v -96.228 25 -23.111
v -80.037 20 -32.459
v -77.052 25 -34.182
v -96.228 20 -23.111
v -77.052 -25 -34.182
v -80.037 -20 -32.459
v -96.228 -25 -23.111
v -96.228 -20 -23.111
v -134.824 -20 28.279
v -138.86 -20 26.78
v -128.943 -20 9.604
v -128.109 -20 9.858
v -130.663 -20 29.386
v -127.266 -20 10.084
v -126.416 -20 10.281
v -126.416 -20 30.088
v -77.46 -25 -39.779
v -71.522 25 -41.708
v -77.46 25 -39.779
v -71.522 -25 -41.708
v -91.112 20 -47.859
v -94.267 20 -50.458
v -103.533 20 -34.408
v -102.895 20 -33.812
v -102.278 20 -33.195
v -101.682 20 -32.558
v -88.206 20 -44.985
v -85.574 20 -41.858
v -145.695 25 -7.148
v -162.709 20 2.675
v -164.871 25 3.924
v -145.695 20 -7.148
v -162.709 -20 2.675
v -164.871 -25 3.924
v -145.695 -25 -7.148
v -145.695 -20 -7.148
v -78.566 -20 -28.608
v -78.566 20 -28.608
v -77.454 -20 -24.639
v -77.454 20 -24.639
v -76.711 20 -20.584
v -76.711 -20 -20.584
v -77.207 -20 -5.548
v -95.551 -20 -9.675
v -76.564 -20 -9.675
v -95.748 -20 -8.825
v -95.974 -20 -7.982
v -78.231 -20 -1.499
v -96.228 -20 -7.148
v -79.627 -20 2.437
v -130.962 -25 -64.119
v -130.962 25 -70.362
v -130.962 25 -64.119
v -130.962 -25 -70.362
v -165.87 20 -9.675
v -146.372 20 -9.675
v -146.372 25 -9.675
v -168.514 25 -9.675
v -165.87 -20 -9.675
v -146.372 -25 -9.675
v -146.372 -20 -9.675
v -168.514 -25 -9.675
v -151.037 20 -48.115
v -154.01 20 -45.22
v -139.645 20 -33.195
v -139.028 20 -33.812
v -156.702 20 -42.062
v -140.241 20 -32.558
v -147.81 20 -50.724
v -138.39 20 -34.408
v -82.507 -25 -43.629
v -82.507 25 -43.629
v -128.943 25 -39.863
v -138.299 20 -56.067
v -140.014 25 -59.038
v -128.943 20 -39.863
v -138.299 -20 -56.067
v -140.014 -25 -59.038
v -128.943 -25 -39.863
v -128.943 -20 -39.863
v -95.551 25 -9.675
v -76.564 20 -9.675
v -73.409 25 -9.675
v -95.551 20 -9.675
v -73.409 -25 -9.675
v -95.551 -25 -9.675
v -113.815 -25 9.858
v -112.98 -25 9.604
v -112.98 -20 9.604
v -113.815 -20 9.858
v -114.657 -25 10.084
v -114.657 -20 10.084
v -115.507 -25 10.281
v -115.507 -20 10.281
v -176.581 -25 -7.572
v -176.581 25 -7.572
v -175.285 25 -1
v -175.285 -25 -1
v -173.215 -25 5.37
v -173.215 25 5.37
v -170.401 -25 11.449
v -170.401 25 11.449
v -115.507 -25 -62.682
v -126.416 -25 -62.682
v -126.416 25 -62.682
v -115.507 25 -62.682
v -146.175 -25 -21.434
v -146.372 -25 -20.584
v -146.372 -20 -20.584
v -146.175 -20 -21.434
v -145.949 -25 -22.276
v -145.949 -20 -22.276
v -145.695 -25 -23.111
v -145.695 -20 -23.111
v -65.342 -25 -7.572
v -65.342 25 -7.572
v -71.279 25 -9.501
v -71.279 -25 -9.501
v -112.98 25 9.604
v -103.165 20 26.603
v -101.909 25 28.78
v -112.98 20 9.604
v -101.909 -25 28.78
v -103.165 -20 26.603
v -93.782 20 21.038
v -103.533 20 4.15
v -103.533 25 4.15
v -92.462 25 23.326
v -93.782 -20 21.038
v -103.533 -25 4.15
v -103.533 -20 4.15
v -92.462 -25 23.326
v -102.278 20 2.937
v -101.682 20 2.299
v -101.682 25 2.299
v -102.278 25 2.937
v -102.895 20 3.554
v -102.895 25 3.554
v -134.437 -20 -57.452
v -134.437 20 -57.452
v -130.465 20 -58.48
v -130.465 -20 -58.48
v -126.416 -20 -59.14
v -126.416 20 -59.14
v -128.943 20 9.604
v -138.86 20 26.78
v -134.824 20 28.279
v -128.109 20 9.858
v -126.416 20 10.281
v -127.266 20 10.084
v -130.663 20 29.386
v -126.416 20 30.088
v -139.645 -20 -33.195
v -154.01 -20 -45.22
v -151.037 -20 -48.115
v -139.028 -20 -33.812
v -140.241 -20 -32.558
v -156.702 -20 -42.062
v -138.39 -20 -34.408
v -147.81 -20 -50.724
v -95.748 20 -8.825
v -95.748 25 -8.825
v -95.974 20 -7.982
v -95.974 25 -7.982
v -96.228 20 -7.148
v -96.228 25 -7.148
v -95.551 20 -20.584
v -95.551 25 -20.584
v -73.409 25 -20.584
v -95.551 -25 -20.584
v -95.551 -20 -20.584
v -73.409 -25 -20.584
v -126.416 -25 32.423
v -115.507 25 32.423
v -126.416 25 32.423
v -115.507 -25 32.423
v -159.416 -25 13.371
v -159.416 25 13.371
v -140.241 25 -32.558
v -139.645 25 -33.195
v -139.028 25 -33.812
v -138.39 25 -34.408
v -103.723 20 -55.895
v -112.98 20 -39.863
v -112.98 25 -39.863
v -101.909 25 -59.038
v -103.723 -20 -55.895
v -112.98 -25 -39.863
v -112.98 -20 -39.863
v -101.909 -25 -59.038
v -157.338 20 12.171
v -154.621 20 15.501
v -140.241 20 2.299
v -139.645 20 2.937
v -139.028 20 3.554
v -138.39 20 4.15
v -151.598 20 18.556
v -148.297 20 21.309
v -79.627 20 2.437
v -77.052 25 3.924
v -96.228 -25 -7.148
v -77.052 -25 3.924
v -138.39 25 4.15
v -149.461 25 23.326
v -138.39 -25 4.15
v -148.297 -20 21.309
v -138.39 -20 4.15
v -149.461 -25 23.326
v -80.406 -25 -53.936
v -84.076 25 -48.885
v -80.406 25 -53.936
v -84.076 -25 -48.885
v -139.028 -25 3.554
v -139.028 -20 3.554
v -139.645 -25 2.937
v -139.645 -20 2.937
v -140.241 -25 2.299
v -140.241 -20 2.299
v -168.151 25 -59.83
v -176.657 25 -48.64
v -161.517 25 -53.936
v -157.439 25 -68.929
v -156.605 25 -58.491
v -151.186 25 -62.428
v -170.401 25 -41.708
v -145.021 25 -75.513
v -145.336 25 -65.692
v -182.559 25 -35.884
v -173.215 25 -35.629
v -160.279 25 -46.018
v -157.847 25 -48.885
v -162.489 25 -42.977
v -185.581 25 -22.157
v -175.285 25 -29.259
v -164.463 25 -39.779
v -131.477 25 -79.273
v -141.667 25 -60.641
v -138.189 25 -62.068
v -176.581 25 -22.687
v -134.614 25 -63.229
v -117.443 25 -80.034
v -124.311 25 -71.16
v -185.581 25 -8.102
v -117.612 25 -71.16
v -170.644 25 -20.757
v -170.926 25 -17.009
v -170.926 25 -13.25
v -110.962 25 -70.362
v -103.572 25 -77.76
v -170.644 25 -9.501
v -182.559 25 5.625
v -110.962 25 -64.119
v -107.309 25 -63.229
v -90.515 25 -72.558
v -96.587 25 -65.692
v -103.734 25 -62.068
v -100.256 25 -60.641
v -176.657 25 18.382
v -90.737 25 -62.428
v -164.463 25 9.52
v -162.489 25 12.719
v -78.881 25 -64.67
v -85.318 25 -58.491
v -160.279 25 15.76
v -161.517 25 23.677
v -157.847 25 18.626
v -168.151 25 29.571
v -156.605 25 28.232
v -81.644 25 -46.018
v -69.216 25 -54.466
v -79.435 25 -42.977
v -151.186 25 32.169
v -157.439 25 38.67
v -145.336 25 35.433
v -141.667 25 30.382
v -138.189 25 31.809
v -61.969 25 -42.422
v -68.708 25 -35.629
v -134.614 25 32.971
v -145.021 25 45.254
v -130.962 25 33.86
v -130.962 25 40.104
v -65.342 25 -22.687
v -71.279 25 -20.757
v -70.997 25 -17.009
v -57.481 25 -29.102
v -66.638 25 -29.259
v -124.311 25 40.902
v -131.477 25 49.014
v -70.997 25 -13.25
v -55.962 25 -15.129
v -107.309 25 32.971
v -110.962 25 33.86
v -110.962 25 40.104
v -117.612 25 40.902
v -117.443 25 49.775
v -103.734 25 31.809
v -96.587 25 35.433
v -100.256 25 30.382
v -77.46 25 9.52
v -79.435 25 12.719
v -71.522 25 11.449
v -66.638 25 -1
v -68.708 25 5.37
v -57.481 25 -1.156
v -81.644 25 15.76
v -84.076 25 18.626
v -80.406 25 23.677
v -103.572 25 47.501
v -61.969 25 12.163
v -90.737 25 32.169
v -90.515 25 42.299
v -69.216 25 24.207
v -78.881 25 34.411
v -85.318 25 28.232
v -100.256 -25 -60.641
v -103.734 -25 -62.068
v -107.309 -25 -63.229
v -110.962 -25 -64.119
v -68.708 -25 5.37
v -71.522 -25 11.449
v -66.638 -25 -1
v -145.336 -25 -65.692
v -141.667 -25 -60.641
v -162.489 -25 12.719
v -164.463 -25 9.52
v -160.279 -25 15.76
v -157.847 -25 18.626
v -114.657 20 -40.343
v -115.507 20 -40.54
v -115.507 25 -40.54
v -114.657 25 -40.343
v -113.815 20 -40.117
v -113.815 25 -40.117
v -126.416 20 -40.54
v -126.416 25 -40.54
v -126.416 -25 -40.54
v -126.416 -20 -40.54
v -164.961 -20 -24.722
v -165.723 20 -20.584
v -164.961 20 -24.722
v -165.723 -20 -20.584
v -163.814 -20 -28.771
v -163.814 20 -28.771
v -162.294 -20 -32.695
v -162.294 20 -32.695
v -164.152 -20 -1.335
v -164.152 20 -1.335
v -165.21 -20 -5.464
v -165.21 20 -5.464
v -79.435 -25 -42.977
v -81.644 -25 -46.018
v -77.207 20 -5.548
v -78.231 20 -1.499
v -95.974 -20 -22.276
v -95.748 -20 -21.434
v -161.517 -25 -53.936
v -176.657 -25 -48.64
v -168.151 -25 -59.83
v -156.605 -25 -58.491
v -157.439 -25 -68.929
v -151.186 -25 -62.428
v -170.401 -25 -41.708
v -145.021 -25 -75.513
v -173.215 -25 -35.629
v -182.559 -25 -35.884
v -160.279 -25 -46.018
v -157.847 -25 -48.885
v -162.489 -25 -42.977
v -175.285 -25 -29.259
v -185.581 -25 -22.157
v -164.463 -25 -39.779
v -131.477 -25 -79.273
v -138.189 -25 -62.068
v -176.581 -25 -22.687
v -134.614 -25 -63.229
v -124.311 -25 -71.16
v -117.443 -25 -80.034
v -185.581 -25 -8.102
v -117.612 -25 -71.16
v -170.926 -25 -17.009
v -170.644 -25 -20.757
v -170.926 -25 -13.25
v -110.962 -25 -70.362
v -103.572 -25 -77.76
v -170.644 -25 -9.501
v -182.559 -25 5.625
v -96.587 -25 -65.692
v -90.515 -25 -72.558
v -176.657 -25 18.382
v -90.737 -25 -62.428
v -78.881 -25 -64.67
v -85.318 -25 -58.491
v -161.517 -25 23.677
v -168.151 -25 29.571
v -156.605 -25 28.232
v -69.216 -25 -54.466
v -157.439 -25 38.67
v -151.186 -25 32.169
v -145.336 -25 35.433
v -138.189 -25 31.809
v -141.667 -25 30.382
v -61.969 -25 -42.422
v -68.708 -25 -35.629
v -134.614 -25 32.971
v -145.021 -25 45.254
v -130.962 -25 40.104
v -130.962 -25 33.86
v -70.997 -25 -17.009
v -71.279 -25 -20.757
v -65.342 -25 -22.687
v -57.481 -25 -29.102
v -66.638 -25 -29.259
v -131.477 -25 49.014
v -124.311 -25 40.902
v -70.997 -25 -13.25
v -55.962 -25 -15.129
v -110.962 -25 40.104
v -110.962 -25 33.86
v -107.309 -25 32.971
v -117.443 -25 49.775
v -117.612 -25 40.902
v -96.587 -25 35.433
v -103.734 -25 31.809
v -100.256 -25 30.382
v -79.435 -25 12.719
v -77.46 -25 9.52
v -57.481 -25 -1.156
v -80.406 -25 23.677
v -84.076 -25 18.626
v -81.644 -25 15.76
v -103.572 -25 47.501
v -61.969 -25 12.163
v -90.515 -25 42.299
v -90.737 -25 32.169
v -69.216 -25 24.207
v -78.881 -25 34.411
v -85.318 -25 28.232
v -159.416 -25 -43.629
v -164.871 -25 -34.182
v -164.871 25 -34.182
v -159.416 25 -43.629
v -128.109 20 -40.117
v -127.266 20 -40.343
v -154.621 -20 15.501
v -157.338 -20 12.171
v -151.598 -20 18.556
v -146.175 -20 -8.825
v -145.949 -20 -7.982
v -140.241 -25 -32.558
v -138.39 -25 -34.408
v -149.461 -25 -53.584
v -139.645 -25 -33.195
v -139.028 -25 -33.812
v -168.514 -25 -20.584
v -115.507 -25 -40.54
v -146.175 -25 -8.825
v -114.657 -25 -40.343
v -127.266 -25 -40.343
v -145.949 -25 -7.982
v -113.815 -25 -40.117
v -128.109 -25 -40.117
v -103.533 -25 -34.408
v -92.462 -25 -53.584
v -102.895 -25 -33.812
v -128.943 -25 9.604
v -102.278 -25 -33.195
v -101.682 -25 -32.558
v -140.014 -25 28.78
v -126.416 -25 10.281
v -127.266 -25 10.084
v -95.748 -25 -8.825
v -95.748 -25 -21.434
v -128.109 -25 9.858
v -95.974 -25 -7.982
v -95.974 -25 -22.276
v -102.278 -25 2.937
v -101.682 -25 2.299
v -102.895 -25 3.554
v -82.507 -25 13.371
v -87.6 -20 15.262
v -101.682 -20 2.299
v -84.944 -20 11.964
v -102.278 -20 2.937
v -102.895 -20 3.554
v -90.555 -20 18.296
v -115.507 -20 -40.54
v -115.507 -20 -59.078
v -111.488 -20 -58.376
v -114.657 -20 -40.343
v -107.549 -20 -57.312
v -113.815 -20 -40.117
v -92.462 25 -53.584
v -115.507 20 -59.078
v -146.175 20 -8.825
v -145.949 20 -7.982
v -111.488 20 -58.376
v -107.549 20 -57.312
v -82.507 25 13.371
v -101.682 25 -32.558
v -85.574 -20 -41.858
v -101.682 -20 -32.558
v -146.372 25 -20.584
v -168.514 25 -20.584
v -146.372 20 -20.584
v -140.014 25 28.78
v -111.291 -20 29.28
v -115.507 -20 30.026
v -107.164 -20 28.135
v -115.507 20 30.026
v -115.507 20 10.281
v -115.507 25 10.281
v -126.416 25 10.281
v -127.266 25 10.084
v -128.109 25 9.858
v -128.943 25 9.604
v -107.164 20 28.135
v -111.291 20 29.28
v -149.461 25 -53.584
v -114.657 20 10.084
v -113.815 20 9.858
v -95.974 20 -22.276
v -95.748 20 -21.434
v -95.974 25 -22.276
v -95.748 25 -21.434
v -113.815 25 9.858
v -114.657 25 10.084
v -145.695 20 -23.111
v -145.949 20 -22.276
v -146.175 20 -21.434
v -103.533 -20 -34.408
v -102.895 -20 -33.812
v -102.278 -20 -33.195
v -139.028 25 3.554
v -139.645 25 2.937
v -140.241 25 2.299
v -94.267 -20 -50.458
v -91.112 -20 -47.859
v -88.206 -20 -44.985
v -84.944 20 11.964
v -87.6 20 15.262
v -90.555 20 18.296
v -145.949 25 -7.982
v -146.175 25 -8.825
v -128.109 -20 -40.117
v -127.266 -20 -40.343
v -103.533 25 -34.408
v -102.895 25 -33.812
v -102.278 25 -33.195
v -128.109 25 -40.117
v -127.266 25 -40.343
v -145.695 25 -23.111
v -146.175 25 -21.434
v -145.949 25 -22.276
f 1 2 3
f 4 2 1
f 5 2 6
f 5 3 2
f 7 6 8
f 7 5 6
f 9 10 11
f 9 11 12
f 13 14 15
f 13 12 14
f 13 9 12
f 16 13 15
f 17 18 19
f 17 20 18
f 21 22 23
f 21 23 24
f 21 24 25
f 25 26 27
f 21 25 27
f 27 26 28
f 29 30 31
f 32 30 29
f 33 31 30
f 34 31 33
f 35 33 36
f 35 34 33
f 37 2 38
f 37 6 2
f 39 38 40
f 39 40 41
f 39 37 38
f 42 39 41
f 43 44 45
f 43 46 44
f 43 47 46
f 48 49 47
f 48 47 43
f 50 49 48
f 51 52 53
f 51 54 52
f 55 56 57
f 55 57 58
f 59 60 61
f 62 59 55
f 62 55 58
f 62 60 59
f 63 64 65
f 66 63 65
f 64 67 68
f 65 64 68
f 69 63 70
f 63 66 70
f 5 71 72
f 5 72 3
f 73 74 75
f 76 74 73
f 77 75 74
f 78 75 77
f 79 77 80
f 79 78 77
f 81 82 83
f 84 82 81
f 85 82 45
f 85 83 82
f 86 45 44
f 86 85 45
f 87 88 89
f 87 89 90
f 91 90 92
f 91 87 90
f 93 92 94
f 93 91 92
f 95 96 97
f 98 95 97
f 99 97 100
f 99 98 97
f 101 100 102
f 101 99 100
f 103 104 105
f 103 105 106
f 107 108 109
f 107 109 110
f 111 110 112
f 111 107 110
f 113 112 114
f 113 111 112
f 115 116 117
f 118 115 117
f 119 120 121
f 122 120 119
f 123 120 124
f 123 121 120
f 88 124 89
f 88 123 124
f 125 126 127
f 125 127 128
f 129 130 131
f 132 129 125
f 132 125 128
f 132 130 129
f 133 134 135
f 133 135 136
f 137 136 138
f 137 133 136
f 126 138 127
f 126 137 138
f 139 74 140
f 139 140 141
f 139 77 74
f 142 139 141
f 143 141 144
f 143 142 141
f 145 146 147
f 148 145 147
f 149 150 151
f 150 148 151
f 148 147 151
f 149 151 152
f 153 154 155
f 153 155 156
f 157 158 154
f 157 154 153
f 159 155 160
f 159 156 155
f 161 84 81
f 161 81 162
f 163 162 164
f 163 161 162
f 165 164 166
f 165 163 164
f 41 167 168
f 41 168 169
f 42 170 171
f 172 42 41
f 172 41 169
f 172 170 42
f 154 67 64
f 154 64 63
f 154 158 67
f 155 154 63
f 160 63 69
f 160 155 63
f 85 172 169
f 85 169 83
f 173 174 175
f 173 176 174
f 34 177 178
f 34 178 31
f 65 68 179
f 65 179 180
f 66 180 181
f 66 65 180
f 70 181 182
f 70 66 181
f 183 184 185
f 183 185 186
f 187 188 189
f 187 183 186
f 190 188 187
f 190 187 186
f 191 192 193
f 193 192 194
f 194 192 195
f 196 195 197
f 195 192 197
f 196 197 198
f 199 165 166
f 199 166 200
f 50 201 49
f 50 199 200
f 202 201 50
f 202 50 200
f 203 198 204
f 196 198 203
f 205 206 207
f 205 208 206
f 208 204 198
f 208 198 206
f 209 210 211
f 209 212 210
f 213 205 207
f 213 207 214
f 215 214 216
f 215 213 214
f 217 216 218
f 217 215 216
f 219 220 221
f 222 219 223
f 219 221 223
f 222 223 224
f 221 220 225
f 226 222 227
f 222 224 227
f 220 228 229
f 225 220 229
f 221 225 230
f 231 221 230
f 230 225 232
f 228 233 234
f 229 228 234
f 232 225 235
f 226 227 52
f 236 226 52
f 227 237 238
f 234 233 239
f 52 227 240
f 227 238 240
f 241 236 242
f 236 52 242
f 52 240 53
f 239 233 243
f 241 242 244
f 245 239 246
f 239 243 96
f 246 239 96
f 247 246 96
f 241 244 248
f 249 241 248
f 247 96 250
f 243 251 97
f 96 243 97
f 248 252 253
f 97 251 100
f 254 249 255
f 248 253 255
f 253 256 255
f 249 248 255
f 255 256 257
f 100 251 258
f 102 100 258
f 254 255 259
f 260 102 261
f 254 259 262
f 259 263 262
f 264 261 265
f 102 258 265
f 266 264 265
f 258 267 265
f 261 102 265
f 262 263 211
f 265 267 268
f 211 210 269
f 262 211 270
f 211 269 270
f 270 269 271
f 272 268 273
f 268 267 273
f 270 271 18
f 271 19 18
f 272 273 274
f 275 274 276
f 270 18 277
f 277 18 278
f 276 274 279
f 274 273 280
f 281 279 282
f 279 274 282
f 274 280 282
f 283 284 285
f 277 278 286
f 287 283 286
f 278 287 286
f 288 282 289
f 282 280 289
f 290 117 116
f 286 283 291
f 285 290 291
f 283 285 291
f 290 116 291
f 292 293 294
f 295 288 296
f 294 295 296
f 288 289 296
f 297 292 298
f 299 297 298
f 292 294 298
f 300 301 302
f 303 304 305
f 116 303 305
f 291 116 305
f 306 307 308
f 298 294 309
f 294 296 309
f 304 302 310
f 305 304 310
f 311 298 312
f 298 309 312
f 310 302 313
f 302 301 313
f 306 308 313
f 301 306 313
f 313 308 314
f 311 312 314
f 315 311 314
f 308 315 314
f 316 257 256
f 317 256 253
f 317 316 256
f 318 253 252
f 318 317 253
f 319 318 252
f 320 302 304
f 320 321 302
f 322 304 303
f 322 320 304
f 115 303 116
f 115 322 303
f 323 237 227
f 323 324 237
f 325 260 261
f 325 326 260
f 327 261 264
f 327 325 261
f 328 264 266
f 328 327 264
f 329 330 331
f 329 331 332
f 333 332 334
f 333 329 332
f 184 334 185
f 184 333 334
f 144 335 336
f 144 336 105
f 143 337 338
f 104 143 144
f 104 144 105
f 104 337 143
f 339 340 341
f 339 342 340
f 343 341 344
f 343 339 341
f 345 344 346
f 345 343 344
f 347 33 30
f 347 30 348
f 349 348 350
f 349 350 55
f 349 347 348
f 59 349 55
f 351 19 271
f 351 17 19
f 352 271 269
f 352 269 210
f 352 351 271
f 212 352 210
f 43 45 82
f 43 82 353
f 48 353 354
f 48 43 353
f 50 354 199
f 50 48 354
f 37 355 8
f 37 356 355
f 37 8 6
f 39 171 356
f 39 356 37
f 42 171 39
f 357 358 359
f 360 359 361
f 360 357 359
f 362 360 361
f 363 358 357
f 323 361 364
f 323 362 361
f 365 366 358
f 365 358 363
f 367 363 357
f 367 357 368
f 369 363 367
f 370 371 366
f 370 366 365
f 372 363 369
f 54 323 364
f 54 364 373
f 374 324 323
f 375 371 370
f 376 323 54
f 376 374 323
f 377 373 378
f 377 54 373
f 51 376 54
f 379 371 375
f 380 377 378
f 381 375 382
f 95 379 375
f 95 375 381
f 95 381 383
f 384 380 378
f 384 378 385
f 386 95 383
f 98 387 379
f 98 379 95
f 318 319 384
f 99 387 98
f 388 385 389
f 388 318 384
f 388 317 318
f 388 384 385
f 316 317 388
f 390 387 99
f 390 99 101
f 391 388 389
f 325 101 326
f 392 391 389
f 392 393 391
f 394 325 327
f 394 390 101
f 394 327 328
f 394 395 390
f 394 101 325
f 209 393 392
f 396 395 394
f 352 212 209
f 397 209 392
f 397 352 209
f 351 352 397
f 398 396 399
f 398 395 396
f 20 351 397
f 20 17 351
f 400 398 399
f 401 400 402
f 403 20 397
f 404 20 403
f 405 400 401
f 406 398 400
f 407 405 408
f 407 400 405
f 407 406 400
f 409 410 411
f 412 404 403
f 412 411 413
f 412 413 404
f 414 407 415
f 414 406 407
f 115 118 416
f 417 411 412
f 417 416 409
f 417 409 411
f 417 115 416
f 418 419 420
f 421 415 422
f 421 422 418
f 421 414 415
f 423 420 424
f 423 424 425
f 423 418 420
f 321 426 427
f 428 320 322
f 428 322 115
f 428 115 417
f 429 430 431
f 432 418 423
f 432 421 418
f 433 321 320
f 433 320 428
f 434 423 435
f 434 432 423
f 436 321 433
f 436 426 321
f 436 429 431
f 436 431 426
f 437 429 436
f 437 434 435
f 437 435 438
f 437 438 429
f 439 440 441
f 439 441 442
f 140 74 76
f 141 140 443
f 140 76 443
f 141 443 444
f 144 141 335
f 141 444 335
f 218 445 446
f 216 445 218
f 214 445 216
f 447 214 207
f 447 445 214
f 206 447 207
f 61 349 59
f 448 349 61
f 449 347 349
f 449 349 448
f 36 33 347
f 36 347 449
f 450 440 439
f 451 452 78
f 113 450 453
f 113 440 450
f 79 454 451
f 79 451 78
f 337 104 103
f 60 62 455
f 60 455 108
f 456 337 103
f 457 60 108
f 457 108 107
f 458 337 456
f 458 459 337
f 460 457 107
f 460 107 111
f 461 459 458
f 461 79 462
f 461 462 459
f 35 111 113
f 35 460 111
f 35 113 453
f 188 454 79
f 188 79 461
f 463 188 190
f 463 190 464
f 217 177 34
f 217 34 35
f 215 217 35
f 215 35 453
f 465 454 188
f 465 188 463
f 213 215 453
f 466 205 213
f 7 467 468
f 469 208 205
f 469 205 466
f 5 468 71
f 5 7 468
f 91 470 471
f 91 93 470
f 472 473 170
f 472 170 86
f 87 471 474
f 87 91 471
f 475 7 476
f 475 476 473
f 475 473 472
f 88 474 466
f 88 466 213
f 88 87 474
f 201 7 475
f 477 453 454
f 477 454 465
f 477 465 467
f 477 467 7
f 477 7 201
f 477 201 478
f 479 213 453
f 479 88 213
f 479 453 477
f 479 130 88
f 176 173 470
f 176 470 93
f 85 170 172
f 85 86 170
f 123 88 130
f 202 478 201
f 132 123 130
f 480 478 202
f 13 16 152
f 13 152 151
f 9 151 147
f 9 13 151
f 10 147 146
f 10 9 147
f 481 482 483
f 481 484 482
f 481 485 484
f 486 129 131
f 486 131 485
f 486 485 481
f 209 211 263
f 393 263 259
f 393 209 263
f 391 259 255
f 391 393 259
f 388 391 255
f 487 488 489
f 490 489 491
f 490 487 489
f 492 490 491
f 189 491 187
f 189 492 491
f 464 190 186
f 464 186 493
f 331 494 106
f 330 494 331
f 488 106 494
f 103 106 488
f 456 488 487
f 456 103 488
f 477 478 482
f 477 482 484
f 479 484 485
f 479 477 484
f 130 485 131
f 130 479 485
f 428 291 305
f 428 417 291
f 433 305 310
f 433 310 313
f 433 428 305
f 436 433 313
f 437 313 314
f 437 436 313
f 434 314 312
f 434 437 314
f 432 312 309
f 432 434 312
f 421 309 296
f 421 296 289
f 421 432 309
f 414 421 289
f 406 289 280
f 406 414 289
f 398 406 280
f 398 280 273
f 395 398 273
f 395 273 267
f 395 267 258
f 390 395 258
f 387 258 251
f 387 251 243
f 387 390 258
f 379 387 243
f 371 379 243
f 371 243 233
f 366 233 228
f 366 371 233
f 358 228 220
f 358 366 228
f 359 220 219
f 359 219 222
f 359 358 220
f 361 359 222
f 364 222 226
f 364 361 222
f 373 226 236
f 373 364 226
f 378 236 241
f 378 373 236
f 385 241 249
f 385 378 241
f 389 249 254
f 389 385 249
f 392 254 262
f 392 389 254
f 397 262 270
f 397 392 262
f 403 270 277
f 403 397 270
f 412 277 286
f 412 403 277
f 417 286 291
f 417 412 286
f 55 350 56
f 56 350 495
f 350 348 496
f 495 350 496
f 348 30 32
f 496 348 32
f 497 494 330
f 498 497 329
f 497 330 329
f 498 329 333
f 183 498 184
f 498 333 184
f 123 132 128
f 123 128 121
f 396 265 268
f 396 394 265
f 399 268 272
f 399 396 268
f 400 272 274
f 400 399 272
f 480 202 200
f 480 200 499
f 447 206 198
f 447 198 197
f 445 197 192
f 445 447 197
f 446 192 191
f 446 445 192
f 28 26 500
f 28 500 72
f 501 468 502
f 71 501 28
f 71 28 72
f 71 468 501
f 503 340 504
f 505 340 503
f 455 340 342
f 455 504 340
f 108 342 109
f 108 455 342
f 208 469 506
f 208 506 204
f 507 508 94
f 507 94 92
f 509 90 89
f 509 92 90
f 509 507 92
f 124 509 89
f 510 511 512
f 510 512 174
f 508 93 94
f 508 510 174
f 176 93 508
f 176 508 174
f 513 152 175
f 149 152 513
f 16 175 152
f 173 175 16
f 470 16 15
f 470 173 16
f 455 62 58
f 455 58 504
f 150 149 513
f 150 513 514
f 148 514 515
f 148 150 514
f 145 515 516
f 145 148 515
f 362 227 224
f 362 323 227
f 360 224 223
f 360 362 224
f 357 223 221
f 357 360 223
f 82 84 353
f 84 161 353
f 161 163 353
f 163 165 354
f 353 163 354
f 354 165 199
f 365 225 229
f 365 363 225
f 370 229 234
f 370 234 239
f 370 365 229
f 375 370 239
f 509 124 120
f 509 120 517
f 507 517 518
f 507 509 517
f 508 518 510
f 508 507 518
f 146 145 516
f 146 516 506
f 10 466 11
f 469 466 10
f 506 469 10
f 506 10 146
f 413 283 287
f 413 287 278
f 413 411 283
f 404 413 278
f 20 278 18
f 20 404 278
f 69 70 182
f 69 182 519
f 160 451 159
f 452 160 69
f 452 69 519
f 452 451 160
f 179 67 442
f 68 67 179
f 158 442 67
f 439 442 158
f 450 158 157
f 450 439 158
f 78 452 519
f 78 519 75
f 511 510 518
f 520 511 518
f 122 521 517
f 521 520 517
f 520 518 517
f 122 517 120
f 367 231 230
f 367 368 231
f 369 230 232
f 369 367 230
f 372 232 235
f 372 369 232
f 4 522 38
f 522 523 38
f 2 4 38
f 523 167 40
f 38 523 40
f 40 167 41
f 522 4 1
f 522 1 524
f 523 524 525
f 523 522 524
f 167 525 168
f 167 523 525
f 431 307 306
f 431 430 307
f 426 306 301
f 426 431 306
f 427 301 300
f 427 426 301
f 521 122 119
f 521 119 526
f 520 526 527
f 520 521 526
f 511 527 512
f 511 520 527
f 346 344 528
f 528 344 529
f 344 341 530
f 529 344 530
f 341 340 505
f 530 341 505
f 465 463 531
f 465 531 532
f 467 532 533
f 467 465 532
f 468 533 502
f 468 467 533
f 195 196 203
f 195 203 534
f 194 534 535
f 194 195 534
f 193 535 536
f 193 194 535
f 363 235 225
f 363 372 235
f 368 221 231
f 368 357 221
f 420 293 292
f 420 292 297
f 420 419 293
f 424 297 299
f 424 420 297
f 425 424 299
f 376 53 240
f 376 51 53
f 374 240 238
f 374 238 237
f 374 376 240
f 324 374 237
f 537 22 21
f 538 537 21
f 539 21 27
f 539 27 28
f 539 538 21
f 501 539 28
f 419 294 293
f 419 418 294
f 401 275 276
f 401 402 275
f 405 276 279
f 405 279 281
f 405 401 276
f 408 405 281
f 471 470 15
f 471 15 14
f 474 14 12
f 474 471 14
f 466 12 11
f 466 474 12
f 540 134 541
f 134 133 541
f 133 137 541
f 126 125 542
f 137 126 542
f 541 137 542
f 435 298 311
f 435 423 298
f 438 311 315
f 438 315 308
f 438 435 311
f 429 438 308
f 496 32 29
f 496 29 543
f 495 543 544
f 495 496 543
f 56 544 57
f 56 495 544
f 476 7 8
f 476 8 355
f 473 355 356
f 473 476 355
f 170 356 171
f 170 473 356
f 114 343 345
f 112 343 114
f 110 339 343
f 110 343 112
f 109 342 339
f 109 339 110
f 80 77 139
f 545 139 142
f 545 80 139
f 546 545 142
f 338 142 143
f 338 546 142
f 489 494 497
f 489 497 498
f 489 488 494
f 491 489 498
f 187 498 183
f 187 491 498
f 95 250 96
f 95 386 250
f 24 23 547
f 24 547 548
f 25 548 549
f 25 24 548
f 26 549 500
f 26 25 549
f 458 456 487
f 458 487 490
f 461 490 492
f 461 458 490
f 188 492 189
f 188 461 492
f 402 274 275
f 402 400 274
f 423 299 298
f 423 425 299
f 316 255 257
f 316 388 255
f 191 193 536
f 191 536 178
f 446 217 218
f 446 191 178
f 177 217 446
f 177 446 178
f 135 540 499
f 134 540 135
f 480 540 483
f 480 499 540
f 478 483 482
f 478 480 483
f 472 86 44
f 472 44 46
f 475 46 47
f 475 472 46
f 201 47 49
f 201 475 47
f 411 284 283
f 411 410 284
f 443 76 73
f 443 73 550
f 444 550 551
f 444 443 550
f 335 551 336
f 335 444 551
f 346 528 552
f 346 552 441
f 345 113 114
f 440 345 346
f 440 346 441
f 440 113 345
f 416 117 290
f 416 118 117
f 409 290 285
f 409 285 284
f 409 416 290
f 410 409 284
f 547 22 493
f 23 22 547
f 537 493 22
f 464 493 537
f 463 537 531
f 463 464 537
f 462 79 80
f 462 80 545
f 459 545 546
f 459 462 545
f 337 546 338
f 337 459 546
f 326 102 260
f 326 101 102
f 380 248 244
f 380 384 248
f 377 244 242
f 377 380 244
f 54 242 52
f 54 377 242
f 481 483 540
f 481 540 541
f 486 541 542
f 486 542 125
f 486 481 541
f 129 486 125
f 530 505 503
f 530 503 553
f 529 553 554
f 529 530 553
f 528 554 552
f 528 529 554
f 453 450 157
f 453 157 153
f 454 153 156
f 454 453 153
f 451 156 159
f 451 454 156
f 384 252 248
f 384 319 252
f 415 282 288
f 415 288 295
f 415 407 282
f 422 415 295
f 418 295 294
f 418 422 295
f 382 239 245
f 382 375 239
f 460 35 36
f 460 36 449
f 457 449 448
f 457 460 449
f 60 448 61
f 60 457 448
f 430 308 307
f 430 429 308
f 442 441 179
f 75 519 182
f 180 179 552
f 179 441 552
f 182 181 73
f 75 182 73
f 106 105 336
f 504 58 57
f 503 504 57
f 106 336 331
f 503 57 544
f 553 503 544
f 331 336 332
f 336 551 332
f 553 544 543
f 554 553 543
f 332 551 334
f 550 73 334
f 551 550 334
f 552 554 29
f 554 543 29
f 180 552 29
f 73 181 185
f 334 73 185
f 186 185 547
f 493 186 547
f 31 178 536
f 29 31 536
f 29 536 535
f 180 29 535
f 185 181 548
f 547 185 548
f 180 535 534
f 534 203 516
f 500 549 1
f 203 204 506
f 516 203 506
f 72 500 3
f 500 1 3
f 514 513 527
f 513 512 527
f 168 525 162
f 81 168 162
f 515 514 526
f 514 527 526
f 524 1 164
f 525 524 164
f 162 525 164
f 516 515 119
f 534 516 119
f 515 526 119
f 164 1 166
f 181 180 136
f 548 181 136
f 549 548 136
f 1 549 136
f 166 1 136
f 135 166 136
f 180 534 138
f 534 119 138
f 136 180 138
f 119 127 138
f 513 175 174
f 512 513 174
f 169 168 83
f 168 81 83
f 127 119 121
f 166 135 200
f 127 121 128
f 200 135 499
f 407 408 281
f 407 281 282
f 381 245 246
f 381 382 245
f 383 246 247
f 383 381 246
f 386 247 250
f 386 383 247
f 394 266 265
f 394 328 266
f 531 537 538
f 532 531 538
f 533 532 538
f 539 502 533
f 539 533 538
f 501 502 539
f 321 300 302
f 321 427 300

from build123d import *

# Parameters (mm, degrees)
F2_DEPTH = 25
F0_R     = 65
F3_DEPTH = 25
F1_R     = 44.916046
F4_DEPTH = 20


with BuildPart() as f2:
    # F0 (on Front) → F2 (new body, symmetric)
    with BuildSketch(Plane.XZ):
        with BuildLine():
            Line((-115.507347, 32.423485), (-120.961553, 32.423485))
            Line((-120.961553, 32.423485), (-126.415759, 32.423485))
            Line((-126.415759, 32.423485), (-126.415759, 10.281243))
            ThreePointArc((-126.415759, 10.281243), (-127.688091, 9.97444), (-128.943364, 9.603973))
            Line((-128.943364, 9.603973), (-140.014485, 28.779717))
            Line((-140.014485, 28.779717), (-144.737966, 26.052614))
            Line((-144.737966, 26.052614), (-149.461447, 23.325511))
            Line((-149.461447, 23.325511), (-138.390326, 4.149767))
            ThreePointArc((-138.390326, 4.149767), (-139.338796, 3.247902), (-140.240661, 2.299432))
            Line((-140.240661, 2.299432), (-159.416405, 13.370553))
            Line((-159.416405, 13.370553), (-162.143508, 8.647072))
            Line((-162.143508, 8.647072), (-164.870611, 3.923591))
            Line((-164.870611, 3.923591), (-145.694867, -7.14753))
            ThreePointArc((-145.694867, -7.14753), (-146.065334, -8.402803), (-146.372137, -9.675135))
            Line((-146.372137, -9.675135), (-168.514379, -9.675135))
            Line((-168.514379, -9.675135), (-168.514379, -15.129341))
            Line((-168.514379, -15.129341), (-168.514379, -20.583547))
            Line((-168.514379, -20.583547), (-146.372137, -20.583547))
            ThreePointArc((-146.372137, -20.583547), (-146.065334, -21.855879), (-145.694867, -23.111152))
            Line((-145.694867, -23.111152), (-164.870611, -34.182273))
            Line((-164.870611, -34.182273), (-162.143508, -38.905754))
            Line((-162.143508, -38.905754), (-159.416405, -43.629235))
            Line((-159.416405, -43.629235), (-140.240661, -32.558114))
            ThreePointArc((-140.240661, -32.558114), (-139.338796, -33.506584), (-138.390326, -34.408449))
            Line((-138.390326, -34.408449), (-149.461447, -53.584193))
            Line((-149.461447, -53.584193), (-144.737966, -56.311296))
            Line((-144.737966, -56.311296), (-140.014485, -59.038399))
            Line((-140.014485, -59.038399), (-128.943364, -39.862655))
            ThreePointArc((-128.943364, -39.862655), (-127.688091, -40.233122), (-126.415759, -40.539925))
            Line((-126.415759, -40.539925), (-126.415759, -62.682167))
            Line((-126.415759, -62.682167), (-120.961553, -62.682167))
            Line((-120.961553, -62.682167), (-115.507347, -62.682167))
            Line((-115.507347, -62.682167), (-115.507347, -40.539925))
            ThreePointArc((-115.507347, -40.539925), (-114.235015, -40.233122), (-112.979742, -39.862655))
            Line((-112.979742, -39.862655), (-101.908621, -59.038399))
            Line((-101.908621, -59.038399), (-97.18514, -56.311296))
            Line((-97.18514, -56.311296), (-92.461659, -53.584193))
            Line((-92.461659, -53.584193), (-103.53278, -34.408449))
            ThreePointArc((-103.53278, -34.408449), (-102.58431, -33.506584), (-101.682445, -32.558114))
            Line((-101.682445, -32.558114), (-82.506701, -43.629235))
            Line((-82.506701, -43.629235), (-79.779598, -38.905754))
            Line((-79.779598, -38.905754), (-77.052495, -34.182273))
            Line((-77.052495, -34.182273), (-96.228239, -23.111152))
            ThreePointArc((-96.228239, -23.111152), (-95.857772, -21.855879), (-95.550969, -20.583547))
            Line((-95.550969, -20.583547), (-73.408727, -20.583547))
            Line((-73.408727, -20.583547), (-73.408727, -15.129341))
            Line((-73.408727, -15.129341), (-73.408727, -9.675135))
            Line((-73.408727, -9.675135), (-95.550969, -9.675135))
            ThreePointArc((-95.550969, -9.675135), (-95.857772, -8.402803), (-96.228239, -7.14753))
            Line((-96.228239, -7.14753), (-77.052495, 3.923591))
            Line((-77.052495, 3.923591), (-79.779598, 8.647072))
            Line((-79.779598, 8.647072), (-82.506701, 13.370553))
            Line((-82.506701, 13.370553), (-101.682445, 2.299432))
            ThreePointArc((-101.682445, 2.299432), (-102.58431, 3.247902), (-103.53278, 4.149767))
            Line((-103.53278, 4.149767), (-92.461659, 23.325511))
            Line((-92.461659, 23.325511), (-97.18514, 26.052614))
            Line((-97.18514, 26.052614), (-101.908621, 28.779717))
            Line((-101.908621, 28.779717), (-112.979742, 9.603973))
            ThreePointArc((-112.979742, 9.603973), (-114.235015, 9.97444), (-115.507347, 10.281243))
            Line((-115.507347, 10.281243), (-115.507347, 32.423485))
        make_face()
    extrude(amount=F2_DEPTH, both=True)

    # F1 (on Front) → F4 (join, symmetric)
    with BuildSketch(Plane.XZ):
        with Locations((-121.217057, -14.525875)):
            Circle(F1_R)
    extrude(amount=F4_DEPTH, both=True)


with BuildPart() as f3:
    # F0 (on Front) → F3 (new body, symmetric)
    with BuildSketch(Plane.XZ):
        with Locations((-120.961553, -15.129341)):
            Circle(F0_R)
        with BuildLine():
            Line((-130.961553, 33.860454), (-130.961553, 40.103608))
            ThreePointArc((-130.961553, 40.103608), (-120.961553, 41.001566), (-110.961553, 40.103608))
            Line((-110.961553, 40.103608), (-110.961553, 33.860454))
            ThreePointArc((-110.961553, 33.860454), (-105.510703, 32.423485), (-100.256244, 30.382088))
            Line((-100.256244, 30.382088), (-96.58661, 35.432906))
            ThreePointArc((-96.58661, 35.432906), (-87.968634, 30.281516), (-80.40627, 23.677201))
            Line((-80.40627, 23.677201), (-84.075904, 18.626383))
            ThreePointArc((-84.075904, 18.626383), (-80.510703, 14.259922), (-77.45966, 9.519904))
            Line((-77.45966, 9.519904), (-71.522067, 11.449144))
            ThreePointArc((-71.522067, 11.449144), (-67.577889, 2.216063), (-65.341727, -7.571986))
            Line((-65.341727, -7.571986), (-71.27932, -9.501227))
            ThreePointArc((-71.27932, -9.501227), (-70.961553, -15.129341), (-71.27932, -20.757455))
            Line((-71.27932, -20.757455), (-65.341727, -22.686696))
            ThreePointArc((-65.341727, -22.686696), (-67.577889, -32.474745), (-71.522067, -41.707826))
            Line((-71.522067, -41.707826), (-77.45966, -39.778585))
            ThreePointArc((-77.45966, -39.778585), (-80.510703, -44.518603), (-84.075904, -48.885065))
            Line((-84.075904, -48.885065), (-80.40627, -53.935883))
            ThreePointArc((-80.40627, -53.935883), (-87.968634, -60.540198), (-96.58661, -65.691588))
            Line((-96.58661, -65.691588), (-100.256244, -60.64077))
            ThreePointArc((-100.256244, -60.64077), (-105.510703, -62.682167), (-110.961553, -64.119136))
            Line((-110.961553, -64.119136), (-110.961553, -70.36229))
            ThreePointArc((-110.961553, -70.36229), (-120.961553, -71.260247), (-130.961553, -70.36229))
            Line((-130.961553, -70.36229), (-130.961553, -64.119136))
            ThreePointArc((-130.961553, -64.119136), (-136.412403, -62.682167), (-141.666862, -60.64077))
            Line((-141.666862, -60.64077), (-145.336496, -65.691588))
            ThreePointArc((-145.336496, -65.691588), (-153.954472, -60.540198), (-161.516836, -53.935883))
            Line((-161.516836, -53.935883), (-157.847202, -48.885065))
            ThreePointArc((-157.847202, -48.885065), (-161.412403, -44.518603), (-164.463447, -39.778585))
            Line((-164.463447, -39.778585), (-170.401039, -41.707826))
            ThreePointArc((-170.401039, -41.707826), (-174.345218, -32.474745), (-176.581379, -22.686696))
            Line((-176.581379, -22.686696), (-170.643787, -20.757455))
            ThreePointArc((-170.643787, -20.757455), (-170.961553, -15.129341), (-170.643787, -9.501227))
            Line((-170.643787, -9.501227), (-176.581379, -7.571986))
            ThreePointArc((-176.581379, -7.571986), (-174.345218, 2.216063), (-170.401039, 11.449144))
            Line((-170.401039, 11.449144), (-164.463447, 9.519904))
            ThreePointArc((-164.463447, 9.519904), (-161.412403, 14.259922), (-157.847202, 18.626383))
            Line((-157.847202, 18.626383), (-161.516836, 23.677201))
            ThreePointArc((-161.516836, 23.677201), (-153.954472, 30.281516), (-145.336496, 35.432906))
            Line((-145.336496, 35.432906), (-141.666862, 30.382088))
            ThreePointArc((-141.666862, 30.382088), (-136.412403, 32.423485), (-130.961553, 33.860454))
        make_face(mode=Mode.SUBTRACT)
    extrude(amount=F3_DEPTH, both=True)


solid = Compound([f2.part, f3.part])
